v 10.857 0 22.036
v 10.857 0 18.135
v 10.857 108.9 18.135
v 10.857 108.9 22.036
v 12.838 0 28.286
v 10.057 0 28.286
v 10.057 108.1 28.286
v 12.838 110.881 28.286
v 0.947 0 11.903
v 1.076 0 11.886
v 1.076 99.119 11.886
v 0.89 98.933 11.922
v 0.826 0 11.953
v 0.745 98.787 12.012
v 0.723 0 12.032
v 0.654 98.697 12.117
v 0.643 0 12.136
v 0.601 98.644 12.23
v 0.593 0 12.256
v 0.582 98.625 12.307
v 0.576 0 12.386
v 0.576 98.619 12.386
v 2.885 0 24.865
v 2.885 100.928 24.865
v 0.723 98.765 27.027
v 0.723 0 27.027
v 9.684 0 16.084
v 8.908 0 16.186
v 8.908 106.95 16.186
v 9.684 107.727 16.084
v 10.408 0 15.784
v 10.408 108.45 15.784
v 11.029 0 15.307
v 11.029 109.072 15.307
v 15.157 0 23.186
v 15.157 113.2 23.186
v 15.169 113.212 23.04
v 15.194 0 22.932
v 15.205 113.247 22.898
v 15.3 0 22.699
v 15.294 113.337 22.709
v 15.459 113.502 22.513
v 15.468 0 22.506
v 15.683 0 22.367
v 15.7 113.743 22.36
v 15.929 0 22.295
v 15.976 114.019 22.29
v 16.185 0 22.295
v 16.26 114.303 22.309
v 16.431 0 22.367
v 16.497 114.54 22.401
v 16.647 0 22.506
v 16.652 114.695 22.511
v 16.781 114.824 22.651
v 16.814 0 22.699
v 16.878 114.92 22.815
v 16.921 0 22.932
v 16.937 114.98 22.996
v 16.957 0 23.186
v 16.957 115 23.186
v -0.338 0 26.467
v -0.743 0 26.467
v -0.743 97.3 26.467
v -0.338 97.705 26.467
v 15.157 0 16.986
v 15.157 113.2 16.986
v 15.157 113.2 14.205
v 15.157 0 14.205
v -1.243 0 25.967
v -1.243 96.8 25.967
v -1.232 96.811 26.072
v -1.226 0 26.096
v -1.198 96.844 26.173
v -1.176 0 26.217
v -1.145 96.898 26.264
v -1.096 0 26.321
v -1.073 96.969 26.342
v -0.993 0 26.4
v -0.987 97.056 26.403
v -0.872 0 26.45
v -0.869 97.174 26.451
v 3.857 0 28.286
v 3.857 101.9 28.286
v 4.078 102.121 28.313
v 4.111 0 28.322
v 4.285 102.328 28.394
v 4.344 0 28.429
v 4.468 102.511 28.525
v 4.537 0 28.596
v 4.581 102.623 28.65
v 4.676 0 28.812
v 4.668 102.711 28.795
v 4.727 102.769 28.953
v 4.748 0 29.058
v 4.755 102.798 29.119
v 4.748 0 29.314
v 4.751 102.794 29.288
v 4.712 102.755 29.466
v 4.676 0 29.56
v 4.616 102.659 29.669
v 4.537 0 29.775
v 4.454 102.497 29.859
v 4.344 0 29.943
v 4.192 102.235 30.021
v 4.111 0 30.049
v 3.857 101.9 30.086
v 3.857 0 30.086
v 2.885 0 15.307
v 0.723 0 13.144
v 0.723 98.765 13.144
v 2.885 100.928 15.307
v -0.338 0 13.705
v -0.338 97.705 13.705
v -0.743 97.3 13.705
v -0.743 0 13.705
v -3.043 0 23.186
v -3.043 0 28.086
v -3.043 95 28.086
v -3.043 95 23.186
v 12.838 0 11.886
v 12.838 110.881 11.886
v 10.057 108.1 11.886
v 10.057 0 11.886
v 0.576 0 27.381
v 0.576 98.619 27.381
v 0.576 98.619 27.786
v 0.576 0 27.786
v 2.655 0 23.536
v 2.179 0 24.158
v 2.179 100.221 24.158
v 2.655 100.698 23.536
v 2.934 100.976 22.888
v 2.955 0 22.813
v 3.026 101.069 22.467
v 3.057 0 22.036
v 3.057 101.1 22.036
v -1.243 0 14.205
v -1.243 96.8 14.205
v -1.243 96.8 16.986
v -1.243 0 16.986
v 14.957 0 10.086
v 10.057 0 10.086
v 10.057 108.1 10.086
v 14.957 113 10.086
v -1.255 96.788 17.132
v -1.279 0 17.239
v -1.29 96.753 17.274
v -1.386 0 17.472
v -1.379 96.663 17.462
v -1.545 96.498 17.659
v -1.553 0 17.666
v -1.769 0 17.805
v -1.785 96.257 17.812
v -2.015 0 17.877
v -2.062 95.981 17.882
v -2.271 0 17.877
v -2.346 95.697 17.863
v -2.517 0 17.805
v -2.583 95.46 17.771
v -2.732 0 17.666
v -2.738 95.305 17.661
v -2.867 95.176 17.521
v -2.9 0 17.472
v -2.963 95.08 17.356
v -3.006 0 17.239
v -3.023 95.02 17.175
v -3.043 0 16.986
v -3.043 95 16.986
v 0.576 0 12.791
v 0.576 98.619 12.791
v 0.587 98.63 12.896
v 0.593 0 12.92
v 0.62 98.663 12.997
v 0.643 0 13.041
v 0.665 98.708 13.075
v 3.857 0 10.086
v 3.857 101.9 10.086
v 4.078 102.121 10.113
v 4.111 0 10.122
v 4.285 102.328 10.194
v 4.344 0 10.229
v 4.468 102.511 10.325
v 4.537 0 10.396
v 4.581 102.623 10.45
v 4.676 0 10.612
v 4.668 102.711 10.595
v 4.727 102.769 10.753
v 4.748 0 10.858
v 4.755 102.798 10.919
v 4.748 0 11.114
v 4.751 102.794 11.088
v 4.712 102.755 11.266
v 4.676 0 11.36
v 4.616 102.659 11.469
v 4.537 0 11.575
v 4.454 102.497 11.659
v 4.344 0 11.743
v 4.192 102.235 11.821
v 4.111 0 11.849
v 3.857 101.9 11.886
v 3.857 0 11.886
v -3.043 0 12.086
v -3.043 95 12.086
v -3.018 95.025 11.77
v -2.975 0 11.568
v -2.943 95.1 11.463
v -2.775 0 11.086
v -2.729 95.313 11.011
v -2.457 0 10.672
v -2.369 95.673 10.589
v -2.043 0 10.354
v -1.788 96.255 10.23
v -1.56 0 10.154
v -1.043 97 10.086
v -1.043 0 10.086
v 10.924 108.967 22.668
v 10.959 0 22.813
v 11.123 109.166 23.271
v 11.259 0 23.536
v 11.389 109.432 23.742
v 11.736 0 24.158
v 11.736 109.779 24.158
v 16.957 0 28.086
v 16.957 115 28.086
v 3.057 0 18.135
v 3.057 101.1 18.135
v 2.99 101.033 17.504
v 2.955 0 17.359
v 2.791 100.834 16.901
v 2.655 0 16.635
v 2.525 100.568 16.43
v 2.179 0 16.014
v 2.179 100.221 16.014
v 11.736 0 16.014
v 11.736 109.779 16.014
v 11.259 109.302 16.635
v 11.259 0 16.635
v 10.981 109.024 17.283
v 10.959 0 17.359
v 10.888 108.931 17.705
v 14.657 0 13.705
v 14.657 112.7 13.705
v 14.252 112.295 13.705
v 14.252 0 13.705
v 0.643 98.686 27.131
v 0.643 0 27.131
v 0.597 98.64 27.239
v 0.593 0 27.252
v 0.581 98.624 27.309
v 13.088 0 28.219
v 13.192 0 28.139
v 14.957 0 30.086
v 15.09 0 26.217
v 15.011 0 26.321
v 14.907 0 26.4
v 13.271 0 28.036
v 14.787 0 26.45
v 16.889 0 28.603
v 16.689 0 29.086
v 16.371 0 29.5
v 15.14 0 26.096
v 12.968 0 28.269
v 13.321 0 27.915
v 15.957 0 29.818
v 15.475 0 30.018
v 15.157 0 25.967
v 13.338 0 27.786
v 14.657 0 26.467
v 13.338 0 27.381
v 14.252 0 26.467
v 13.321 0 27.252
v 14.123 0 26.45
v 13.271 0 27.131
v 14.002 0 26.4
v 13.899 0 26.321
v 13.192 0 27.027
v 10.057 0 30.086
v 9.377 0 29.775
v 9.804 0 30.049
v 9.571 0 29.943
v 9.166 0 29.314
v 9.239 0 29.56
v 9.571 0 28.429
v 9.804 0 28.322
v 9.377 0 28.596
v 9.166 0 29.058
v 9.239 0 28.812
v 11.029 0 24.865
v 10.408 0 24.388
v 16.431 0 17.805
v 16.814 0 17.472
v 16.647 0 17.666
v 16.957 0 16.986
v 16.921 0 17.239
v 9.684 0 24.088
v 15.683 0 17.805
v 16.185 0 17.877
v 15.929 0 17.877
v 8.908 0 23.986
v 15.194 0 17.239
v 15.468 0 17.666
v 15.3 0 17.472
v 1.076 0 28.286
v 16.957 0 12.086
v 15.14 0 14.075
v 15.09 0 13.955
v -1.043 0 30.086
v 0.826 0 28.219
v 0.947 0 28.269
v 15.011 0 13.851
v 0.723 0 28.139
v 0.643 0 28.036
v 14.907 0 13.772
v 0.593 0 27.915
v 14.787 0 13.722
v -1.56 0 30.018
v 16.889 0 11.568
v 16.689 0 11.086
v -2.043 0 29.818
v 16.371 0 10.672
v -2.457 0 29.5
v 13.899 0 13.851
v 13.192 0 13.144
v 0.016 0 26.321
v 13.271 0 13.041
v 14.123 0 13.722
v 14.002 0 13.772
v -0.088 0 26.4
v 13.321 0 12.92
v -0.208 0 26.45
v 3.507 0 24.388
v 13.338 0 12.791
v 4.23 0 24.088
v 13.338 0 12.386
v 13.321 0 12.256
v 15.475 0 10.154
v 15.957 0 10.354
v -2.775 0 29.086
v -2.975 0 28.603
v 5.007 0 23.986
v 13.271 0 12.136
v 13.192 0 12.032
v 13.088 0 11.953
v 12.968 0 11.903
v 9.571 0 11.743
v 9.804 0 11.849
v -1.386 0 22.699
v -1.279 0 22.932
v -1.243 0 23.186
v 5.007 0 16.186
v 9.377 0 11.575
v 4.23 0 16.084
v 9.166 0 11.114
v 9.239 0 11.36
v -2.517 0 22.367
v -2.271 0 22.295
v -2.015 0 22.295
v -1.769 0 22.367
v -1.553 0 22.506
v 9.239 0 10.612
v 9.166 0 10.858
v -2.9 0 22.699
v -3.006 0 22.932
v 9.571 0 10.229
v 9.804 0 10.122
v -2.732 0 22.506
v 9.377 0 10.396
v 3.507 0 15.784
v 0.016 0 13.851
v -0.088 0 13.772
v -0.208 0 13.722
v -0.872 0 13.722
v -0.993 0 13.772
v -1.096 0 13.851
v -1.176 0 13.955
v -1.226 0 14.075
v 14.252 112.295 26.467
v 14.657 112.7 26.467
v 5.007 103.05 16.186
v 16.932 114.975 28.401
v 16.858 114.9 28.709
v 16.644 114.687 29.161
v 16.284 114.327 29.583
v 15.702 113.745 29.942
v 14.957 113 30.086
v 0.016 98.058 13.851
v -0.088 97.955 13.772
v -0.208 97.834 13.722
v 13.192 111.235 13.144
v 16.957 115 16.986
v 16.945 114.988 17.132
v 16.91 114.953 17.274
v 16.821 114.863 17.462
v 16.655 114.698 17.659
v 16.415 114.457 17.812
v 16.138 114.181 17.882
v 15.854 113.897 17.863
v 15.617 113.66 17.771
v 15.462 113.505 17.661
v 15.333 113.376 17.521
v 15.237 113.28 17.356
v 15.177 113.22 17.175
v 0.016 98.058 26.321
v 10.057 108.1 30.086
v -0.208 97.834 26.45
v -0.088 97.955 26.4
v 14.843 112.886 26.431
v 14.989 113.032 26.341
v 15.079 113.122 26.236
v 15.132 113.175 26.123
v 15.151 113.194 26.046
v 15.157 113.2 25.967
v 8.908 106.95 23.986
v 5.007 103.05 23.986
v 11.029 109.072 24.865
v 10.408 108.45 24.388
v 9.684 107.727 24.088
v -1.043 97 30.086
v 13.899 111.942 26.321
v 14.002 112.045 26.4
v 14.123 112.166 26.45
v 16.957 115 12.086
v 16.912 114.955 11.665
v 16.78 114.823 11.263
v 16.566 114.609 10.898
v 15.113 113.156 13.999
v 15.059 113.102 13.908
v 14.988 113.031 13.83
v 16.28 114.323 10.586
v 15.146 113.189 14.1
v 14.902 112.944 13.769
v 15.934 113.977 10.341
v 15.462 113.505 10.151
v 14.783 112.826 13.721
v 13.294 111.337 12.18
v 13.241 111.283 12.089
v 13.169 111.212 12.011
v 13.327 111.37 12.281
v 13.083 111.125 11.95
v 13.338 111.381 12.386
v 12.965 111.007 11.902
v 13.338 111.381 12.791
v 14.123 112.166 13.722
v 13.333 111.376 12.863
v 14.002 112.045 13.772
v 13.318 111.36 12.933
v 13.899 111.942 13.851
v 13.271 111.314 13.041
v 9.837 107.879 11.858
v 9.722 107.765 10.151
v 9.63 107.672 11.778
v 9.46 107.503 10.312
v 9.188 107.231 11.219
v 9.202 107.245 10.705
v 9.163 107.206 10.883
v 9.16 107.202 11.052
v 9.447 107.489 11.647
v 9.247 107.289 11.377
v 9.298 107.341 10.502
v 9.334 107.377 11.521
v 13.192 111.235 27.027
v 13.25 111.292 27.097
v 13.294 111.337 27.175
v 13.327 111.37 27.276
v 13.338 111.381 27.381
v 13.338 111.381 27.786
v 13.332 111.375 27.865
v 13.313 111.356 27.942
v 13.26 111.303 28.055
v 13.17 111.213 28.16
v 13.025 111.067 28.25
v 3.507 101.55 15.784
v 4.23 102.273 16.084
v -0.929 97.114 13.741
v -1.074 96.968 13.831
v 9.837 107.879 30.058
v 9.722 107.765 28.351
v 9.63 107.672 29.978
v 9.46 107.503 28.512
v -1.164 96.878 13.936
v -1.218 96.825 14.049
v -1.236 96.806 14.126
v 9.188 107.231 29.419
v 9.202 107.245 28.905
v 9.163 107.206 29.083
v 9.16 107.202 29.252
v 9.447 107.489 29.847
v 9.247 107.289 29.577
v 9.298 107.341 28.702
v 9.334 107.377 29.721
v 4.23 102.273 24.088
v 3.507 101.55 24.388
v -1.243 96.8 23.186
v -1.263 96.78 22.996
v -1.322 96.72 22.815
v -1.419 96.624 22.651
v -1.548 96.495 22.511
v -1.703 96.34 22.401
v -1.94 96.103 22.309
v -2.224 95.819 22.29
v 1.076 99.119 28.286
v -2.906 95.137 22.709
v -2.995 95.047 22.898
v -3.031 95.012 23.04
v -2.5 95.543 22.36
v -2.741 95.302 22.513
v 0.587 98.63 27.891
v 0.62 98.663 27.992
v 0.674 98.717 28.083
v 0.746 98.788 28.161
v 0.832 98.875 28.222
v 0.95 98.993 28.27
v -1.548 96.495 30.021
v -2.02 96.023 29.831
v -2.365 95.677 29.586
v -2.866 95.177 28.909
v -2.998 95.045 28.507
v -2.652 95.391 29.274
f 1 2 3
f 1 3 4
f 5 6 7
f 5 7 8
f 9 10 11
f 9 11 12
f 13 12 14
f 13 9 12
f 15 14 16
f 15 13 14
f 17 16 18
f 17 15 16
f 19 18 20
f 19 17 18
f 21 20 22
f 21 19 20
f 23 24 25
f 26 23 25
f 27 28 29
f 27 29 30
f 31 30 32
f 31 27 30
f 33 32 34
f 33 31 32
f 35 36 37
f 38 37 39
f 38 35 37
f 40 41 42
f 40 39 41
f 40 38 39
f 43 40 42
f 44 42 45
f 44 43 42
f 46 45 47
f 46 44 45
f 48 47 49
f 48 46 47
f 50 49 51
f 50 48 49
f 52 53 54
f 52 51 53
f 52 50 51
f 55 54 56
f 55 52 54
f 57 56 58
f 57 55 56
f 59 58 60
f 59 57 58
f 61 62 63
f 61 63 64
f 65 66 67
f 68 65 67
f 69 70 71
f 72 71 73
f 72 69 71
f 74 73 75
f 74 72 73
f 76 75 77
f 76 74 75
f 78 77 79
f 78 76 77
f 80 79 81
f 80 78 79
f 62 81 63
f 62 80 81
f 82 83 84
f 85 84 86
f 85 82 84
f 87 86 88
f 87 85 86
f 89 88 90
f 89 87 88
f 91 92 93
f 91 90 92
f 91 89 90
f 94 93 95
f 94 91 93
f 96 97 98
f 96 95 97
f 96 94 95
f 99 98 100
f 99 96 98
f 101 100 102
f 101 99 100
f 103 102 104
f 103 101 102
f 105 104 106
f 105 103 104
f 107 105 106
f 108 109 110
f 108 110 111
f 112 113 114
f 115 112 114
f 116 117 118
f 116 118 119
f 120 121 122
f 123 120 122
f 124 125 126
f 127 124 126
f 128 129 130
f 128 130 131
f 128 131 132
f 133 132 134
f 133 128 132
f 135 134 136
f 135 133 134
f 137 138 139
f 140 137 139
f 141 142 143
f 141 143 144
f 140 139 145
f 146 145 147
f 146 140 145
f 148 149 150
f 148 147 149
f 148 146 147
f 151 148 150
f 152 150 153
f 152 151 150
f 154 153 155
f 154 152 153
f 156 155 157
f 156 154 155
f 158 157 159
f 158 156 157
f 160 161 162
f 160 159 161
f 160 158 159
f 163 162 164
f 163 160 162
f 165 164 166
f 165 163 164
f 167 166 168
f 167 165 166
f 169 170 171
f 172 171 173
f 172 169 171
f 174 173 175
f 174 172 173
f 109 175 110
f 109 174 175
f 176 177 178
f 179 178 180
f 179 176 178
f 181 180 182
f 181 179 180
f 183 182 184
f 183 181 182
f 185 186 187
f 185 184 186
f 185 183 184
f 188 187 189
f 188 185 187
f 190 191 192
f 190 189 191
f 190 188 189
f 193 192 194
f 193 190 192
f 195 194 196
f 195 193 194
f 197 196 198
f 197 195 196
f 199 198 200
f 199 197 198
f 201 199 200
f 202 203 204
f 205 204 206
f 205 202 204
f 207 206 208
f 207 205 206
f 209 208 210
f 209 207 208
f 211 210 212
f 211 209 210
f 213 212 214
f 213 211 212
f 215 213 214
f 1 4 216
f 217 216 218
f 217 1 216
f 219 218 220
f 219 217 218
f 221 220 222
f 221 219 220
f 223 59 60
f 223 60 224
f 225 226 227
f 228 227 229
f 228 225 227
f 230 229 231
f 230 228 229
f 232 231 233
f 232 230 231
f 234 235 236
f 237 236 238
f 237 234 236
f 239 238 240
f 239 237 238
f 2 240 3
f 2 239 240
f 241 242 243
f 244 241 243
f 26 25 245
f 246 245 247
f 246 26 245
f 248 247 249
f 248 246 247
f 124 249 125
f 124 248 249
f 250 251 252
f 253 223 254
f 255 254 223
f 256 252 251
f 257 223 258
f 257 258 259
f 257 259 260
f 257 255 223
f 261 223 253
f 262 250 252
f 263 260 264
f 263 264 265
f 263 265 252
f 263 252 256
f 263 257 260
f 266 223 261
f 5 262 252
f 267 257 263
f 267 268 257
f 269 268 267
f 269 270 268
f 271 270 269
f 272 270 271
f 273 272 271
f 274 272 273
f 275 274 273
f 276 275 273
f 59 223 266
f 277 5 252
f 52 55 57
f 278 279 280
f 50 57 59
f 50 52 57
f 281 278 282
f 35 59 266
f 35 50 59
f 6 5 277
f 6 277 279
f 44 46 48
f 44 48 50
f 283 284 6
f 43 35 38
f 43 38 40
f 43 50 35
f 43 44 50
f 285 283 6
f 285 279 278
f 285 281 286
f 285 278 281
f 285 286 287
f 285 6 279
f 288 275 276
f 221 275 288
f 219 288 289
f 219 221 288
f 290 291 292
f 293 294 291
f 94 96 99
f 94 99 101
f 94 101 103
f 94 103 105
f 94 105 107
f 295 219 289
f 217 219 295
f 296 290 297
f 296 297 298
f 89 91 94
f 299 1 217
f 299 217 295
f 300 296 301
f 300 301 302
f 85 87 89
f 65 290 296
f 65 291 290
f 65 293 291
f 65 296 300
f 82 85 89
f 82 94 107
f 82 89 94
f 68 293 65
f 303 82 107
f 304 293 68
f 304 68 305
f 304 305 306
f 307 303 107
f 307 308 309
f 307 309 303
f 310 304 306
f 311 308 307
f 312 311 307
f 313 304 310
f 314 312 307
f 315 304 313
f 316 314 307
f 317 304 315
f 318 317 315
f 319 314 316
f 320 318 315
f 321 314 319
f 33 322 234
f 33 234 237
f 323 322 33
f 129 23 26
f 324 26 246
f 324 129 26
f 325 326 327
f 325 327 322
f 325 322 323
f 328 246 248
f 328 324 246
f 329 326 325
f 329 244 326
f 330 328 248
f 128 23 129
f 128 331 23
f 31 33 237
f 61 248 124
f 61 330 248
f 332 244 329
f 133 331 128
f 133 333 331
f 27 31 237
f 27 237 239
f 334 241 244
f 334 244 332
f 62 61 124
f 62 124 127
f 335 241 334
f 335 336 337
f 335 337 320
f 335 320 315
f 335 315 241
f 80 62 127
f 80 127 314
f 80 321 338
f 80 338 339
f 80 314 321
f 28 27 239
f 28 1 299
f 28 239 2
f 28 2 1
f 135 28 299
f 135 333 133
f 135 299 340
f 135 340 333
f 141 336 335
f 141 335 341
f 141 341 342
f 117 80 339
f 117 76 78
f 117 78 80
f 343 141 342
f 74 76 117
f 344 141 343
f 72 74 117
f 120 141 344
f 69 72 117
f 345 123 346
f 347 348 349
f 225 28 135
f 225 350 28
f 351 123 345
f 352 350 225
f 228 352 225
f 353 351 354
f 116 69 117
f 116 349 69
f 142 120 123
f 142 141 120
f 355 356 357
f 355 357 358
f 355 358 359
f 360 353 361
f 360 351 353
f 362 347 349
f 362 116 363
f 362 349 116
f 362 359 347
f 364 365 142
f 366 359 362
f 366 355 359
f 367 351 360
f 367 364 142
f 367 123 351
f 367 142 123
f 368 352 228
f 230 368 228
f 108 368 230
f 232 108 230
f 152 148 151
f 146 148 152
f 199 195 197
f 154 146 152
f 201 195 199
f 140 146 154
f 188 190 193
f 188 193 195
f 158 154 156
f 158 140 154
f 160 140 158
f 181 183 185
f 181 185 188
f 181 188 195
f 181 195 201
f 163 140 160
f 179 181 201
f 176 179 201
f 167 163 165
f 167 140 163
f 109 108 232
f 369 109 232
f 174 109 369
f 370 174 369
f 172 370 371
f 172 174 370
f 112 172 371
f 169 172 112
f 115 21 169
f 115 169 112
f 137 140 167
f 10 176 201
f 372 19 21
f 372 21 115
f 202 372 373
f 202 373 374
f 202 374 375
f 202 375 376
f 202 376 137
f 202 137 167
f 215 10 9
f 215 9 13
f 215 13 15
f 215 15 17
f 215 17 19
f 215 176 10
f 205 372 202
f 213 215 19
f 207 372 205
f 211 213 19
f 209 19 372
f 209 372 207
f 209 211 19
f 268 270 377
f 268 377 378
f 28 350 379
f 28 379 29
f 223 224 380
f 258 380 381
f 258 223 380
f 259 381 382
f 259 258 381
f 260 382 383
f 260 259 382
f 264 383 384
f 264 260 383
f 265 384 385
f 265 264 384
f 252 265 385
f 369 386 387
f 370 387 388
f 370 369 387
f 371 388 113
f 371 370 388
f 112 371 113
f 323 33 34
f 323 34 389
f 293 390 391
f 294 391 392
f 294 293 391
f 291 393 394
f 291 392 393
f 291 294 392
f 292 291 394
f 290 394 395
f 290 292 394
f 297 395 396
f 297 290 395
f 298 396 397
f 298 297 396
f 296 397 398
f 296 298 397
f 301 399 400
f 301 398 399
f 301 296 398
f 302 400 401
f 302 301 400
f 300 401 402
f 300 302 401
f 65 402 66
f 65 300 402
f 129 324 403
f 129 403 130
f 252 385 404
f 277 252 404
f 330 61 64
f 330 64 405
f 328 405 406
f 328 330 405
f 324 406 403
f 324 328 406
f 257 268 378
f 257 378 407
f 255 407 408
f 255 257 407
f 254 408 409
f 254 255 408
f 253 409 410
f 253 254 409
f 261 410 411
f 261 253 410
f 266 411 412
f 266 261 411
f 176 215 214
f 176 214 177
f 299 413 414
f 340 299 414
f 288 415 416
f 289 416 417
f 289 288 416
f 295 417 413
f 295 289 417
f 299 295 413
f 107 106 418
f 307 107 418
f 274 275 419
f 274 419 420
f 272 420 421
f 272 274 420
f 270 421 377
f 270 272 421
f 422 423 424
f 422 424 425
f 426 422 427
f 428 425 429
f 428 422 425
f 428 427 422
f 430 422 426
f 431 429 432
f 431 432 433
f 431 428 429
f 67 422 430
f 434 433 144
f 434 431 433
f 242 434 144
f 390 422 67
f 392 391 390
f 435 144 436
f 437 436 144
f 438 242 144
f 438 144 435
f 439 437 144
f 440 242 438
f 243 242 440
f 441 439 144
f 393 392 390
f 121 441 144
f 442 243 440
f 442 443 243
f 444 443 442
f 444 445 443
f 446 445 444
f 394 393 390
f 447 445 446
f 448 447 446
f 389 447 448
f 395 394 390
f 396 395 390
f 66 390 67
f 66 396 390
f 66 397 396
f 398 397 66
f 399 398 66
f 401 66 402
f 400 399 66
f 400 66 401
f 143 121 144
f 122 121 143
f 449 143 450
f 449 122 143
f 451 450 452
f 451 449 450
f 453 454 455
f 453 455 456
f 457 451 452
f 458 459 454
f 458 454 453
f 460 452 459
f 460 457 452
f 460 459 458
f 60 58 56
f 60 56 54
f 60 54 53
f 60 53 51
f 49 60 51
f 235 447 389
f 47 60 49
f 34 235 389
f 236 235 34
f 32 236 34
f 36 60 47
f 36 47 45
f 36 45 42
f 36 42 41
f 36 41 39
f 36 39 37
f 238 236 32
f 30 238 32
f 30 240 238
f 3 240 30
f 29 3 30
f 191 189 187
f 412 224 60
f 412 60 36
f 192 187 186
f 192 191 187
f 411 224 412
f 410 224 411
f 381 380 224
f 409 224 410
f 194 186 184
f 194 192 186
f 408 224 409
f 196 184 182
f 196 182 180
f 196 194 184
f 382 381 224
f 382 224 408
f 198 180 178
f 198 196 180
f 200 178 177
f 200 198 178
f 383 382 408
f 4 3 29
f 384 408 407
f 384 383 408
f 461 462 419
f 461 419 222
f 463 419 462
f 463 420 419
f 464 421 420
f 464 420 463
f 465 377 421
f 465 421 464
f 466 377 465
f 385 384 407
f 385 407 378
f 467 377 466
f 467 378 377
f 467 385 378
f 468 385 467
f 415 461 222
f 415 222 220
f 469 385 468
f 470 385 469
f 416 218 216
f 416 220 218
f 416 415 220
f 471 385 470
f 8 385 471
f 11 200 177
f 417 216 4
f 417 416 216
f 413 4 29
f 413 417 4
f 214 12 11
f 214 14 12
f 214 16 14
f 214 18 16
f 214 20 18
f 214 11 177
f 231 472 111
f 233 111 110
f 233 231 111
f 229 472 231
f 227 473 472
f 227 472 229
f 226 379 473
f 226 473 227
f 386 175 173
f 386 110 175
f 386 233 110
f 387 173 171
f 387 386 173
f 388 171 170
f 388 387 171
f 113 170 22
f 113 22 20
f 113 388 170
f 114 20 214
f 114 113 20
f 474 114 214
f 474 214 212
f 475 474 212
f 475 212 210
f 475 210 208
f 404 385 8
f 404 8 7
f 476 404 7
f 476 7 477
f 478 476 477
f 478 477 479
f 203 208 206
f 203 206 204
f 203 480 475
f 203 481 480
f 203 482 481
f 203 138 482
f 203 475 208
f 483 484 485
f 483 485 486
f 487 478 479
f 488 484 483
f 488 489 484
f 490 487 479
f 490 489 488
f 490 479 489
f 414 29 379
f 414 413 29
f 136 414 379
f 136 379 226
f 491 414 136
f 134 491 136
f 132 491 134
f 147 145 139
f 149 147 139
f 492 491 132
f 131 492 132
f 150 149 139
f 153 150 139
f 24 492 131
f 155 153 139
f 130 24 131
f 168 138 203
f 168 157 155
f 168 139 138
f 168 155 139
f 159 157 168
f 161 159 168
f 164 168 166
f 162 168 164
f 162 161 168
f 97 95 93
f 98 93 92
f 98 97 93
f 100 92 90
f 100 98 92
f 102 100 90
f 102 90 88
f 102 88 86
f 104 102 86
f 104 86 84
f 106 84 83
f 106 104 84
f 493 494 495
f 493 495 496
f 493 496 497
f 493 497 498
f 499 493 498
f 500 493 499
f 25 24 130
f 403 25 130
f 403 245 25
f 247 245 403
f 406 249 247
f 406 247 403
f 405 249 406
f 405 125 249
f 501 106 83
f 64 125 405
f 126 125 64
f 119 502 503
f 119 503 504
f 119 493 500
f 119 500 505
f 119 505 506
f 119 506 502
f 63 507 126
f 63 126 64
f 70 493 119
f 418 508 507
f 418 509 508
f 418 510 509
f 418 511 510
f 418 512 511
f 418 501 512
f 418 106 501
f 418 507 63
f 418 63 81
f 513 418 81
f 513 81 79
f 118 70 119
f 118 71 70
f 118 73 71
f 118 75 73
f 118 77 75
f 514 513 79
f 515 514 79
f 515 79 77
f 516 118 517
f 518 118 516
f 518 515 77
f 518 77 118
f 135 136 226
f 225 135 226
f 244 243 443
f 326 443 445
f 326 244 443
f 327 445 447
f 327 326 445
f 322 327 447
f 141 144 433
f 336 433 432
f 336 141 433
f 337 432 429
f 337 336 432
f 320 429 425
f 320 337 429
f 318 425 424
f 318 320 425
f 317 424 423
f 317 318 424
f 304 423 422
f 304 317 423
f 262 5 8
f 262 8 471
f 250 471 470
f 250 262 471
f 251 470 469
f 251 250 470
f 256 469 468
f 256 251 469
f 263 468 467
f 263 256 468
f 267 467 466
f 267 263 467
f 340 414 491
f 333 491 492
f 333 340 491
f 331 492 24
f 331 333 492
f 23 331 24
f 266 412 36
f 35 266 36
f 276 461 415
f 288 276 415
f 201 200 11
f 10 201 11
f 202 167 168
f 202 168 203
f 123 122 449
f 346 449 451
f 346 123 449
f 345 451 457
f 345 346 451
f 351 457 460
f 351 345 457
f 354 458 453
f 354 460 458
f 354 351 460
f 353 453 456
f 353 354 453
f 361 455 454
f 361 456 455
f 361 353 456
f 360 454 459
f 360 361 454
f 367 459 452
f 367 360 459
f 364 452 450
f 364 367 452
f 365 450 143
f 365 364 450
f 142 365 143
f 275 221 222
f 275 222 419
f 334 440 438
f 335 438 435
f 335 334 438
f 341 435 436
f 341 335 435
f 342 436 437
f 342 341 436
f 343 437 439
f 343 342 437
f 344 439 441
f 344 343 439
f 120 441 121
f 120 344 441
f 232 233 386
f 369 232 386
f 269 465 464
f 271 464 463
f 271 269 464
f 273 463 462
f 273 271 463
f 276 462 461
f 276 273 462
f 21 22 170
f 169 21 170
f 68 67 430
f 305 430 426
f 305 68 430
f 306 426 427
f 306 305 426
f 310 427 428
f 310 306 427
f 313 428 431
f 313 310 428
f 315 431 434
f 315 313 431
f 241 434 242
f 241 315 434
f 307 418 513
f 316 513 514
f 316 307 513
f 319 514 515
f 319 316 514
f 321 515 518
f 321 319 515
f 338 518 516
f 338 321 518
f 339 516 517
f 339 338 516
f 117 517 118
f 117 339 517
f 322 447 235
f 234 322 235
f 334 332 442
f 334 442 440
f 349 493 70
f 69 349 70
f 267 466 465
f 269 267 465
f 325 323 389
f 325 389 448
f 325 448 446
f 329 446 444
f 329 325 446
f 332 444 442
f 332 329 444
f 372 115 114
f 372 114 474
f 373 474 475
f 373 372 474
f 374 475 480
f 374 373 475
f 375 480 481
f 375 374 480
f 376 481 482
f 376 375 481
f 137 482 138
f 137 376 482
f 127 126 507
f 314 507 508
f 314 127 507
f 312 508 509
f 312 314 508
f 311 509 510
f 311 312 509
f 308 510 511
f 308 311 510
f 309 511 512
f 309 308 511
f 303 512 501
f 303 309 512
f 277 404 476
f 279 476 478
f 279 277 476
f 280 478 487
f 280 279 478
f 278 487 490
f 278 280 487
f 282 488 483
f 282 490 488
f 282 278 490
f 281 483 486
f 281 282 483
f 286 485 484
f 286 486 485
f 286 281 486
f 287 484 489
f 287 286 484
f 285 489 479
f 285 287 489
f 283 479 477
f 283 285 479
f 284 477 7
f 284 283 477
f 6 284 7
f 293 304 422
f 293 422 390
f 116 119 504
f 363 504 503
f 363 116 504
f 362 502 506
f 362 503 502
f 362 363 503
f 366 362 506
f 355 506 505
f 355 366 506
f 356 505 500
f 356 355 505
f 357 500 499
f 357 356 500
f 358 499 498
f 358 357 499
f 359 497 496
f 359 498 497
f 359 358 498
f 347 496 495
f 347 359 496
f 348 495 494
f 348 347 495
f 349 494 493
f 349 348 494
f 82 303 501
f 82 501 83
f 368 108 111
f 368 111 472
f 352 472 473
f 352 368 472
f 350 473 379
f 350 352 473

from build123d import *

# Parameters (mm, degrees)
EXTRUDE_1_DEPTH     = 115
CUT_EXTRUDE_1_DEPTH = 118.951465627


with BuildPart() as part:
    # 草图1 → 凸台-拉伸1 (new body)
    with BuildSketch(Plane(origin=(0, 0, 0), x_dir=(1, 0, 0), z_dir=(0, 1, 0))):
        with BuildLine():
            Line((-1.042752475, -10.085861632), (3.857247525, -10.085861632))
            ThreePointArc((3.857247525, -10.085861632), (4.757247525, -10.985861632), (3.857247525, -11.885861632))
            Line((3.857247525, -11.885861632), (1.076161722, -11.885861632))
            ThreePointArc((1.076161722, -11.885861632), (0.722608332, -12.032308241), (0.576161722, -12.385861632))
            Line((0.576161722, -12.385861632), (0.576161722, -12.790788968))
            ThreePointArc((0.576161722, -12.790788968), (0.614221956, -12.982130685), (0.722608332, -13.144342359))
            Line((0.722608332, -13.144342359), (2.885447948, -15.307181975))
            ThreePointArc((2.885447948, -15.307181975), (3.858717994, -15.957500229), (5.006768291, -16.185861632))
            Line((5.006768291, -16.185861632), (8.907726758, -16.185861632))
            ThreePointArc((8.907726758, -16.185861632), (10.055777055, -15.957500229), (11.029047102, -15.307181975))
            Line((11.029047102, -15.307181975), (13.191886718, -13.144342359))
            ThreePointArc((13.191886718, -13.144342359), (13.300273094, -12.982130685), (13.338333327, -12.790788968))
            Line((13.338333327, -12.790788968), (13.338333327, -12.385861632))
            ThreePointArc((13.338333327, -12.385861632), (13.191886718, -12.032308241), (12.838333327, -11.885861632))
            Line((12.838333327, -11.885861632), (10.057247525, -11.885861632))
            ThreePointArc((10.057247525, -11.885861632), (9.157247525, -10.985861632), (10.057247525, -10.085861632))
            Line((10.057247525, -10.085861632), (14.957247525, -10.085861632))
            ThreePointArc((14.957247525, -10.085861632), (16.371461087, -10.671648069), (16.957247525, -12.085861632))
            Line((16.957247525, -12.085861632), (16.957247525, -16.985861632))
            ThreePointArc((16.957247525, -16.985861632), (16.057247525, -17.885861632), (15.157247525, -16.985861632))
            Line((15.157247525, -16.985861632), (15.157247525, -14.204775829))
            ThreePointArc((15.157247525, -14.204775829), (15.010800915, -13.851222438), (14.657247525, -13.704775829))
            Line((14.657247525, -13.704775829), (14.252320188, -13.704775829))
            ThreePointArc((14.252320188, -13.704775829), (14.060978472, -13.742836063), (13.898766797, -13.851222438))
            Line((13.898766797, -13.851222438), (11.735927181, -16.014062054))
            ThreePointArc((11.735927181, -16.014062054), (11.085608927, -16.987332101), (10.857247525, -18.135382398))
            Line((10.857247525, -18.135382398), (10.857247525, -22.036340865))
            ThreePointArc((10.857247525, -22.036340865), (11.085608927, -23.184391162), (11.735927181, -24.157661209))
            Line((11.735927181, -24.157661209), (13.898766797, -26.320500825))
            ThreePointArc((13.898766797, -26.320500825), (14.060978472, -26.4288872), (14.252320188, -26.466947434))
            Line((14.252320188, -26.466947434), (14.657247525, -26.466947434))
            ThreePointArc((14.657247525, -26.466947434), (15.010800915, -26.320500825), (15.157247525, -25.966947434))
            Line((15.157247525, -25.966947434), (15.157247525, -23.185861632))
            ThreePointArc((15.157247525, -23.185861632), (16.057247525, -22.285861632), (16.957247525, -23.185861632))
            Line((16.957247525, -23.185861632), (16.957247525, -28.085861632))
            ThreePointArc((16.957247525, -28.085861632), (16.371461087, -29.500075194), (14.957247525, -30.085861632))
            Line((14.957247525, -30.085861632), (10.057247525, -30.085861632))
            ThreePointArc((10.057247525, -30.085861632), (9.157247525, -29.185861632), (10.057247525, -28.285861632))
            Line((10.057247525, -28.285861632), (12.838333327, -28.285861632))
            ThreePointArc((12.838333327, -28.285861632), (13.191886718, -28.139415022), (13.338333327, -27.785861632))
            Line((13.338333327, -27.785861632), (13.338333327, -27.380934295))
            ThreePointArc((13.338333327, -27.380934295), (13.300273094, -27.189592579), (13.191886718, -27.027380904))
            Line((13.191886718, -27.027380904), (11.029047102, -24.864541288))
            ThreePointArc((11.029047102, -24.864541288), (10.055777055, -24.214223034), (8.907726758, -23.985861632))
            Line((8.907726758, -23.985861632), (5.006768291, -23.985861632))
            ThreePointArc((5.006768291, -23.985861632), (3.858717994, -24.214223034), (2.885447948, -24.864541288))
            Line((2.885447948, -24.864541288), (0.722608332, -27.027380904))
            ThreePointArc((0.722608332, -27.027380904), (0.614221956, -27.189592579), (0.576161722, -27.380934295))
            Line((0.576161722, -27.380934295), (0.576161722, -27.785861632))
            ThreePointArc((0.576161722, -27.785861632), (0.722608332, -28.139415022), (1.076161722, -28.285861632))
            Line((1.076161722, -28.285861632), (3.857247525, -28.285861632))
            ThreePointArc((3.857247525, -28.285861632), (4.757247525, -29.185861632), (3.857247525, -30.085861632))
            Line((3.857247525, -30.085861632), (-1.042752475, -30.085861632))
            ThreePointArc((-1.042752475, -30.085861632), (-2.456966038, -29.500075194), (-3.042752475, -28.085861632))
            Line((-3.042752475, -28.085861632), (-3.042752475, -23.185861632))
            ThreePointArc((-3.042752475, -23.185861632), (-2.142752475, -22.285861632), (-1.242752475, -23.185861632))
            Line((-1.242752475, -23.185861632), (-1.242752475, -25.966947434))
            ThreePointArc((-1.242752475, -25.966947434), (-1.096305866, -26.320500825), (-0.742752475, -26.466947434))
            Line((-0.742752475, -26.466947434), (-0.337825138, -26.466947434))
            ThreePointArc((-0.337825138, -26.466947434), (-0.146483422, -26.4288872), (0.015728252, -26.320500825))
            Line((0.015728252, -26.320500825), (2.178567868, -24.157661209))
            ThreePointArc((2.178567868, -24.157661209), (2.828886122, -23.184391162), (3.057247525, -22.036340865))
            Line((3.057247525, -22.036340865), (3.057247525, -18.135382398))
            ThreePointArc((3.057247525, -18.135382398), (2.828886122, -16.987332101), (2.178567868, -16.014062054))
            Line((2.178567868, -16.014062054), (0.015728252, -13.851222438))
            ThreePointArc((0.015728252, -13.851222438), (-0.146483422, -13.742836063), (-0.337825138, -13.704775829))
            Line((-0.337825138, -13.704775829), (-0.742752475, -13.704775829))
            ThreePointArc((-0.742752475, -13.704775829), (-1.096305866, -13.851222438), (-1.242752475, -14.204775829))
            Line((-1.242752475, -14.204775829), (-1.242752475, -16.985861632))
            ThreePointArc((-1.242752475, -16.985861632), (-2.142752475, -17.885861632), (-3.042752475, -16.985861632))
            Line((-3.042752475, -16.985861632), (-3.042752475, -12.085861632))
            ThreePointArc((-3.042752475, -12.085861632), (-2.456966038, -10.671648069), (-1.042752475, -10.085861632))
        make_face()
    extrude(amount=EXTRUDE_1_DEPTH)

    # 草图2 → 切除-拉伸1 (cut, through all)
    with BuildSketch(Plane.XY.offset(30.085861632)):
        Polygon((16.957247525, 115), (-3.042752475, 95), (-3.042752475, 115), align=None)
    extrude(amount=-CUT_EXTRUDE_1_DEPTH, mode=Mode.SUBTRACT)


solid = part.part
